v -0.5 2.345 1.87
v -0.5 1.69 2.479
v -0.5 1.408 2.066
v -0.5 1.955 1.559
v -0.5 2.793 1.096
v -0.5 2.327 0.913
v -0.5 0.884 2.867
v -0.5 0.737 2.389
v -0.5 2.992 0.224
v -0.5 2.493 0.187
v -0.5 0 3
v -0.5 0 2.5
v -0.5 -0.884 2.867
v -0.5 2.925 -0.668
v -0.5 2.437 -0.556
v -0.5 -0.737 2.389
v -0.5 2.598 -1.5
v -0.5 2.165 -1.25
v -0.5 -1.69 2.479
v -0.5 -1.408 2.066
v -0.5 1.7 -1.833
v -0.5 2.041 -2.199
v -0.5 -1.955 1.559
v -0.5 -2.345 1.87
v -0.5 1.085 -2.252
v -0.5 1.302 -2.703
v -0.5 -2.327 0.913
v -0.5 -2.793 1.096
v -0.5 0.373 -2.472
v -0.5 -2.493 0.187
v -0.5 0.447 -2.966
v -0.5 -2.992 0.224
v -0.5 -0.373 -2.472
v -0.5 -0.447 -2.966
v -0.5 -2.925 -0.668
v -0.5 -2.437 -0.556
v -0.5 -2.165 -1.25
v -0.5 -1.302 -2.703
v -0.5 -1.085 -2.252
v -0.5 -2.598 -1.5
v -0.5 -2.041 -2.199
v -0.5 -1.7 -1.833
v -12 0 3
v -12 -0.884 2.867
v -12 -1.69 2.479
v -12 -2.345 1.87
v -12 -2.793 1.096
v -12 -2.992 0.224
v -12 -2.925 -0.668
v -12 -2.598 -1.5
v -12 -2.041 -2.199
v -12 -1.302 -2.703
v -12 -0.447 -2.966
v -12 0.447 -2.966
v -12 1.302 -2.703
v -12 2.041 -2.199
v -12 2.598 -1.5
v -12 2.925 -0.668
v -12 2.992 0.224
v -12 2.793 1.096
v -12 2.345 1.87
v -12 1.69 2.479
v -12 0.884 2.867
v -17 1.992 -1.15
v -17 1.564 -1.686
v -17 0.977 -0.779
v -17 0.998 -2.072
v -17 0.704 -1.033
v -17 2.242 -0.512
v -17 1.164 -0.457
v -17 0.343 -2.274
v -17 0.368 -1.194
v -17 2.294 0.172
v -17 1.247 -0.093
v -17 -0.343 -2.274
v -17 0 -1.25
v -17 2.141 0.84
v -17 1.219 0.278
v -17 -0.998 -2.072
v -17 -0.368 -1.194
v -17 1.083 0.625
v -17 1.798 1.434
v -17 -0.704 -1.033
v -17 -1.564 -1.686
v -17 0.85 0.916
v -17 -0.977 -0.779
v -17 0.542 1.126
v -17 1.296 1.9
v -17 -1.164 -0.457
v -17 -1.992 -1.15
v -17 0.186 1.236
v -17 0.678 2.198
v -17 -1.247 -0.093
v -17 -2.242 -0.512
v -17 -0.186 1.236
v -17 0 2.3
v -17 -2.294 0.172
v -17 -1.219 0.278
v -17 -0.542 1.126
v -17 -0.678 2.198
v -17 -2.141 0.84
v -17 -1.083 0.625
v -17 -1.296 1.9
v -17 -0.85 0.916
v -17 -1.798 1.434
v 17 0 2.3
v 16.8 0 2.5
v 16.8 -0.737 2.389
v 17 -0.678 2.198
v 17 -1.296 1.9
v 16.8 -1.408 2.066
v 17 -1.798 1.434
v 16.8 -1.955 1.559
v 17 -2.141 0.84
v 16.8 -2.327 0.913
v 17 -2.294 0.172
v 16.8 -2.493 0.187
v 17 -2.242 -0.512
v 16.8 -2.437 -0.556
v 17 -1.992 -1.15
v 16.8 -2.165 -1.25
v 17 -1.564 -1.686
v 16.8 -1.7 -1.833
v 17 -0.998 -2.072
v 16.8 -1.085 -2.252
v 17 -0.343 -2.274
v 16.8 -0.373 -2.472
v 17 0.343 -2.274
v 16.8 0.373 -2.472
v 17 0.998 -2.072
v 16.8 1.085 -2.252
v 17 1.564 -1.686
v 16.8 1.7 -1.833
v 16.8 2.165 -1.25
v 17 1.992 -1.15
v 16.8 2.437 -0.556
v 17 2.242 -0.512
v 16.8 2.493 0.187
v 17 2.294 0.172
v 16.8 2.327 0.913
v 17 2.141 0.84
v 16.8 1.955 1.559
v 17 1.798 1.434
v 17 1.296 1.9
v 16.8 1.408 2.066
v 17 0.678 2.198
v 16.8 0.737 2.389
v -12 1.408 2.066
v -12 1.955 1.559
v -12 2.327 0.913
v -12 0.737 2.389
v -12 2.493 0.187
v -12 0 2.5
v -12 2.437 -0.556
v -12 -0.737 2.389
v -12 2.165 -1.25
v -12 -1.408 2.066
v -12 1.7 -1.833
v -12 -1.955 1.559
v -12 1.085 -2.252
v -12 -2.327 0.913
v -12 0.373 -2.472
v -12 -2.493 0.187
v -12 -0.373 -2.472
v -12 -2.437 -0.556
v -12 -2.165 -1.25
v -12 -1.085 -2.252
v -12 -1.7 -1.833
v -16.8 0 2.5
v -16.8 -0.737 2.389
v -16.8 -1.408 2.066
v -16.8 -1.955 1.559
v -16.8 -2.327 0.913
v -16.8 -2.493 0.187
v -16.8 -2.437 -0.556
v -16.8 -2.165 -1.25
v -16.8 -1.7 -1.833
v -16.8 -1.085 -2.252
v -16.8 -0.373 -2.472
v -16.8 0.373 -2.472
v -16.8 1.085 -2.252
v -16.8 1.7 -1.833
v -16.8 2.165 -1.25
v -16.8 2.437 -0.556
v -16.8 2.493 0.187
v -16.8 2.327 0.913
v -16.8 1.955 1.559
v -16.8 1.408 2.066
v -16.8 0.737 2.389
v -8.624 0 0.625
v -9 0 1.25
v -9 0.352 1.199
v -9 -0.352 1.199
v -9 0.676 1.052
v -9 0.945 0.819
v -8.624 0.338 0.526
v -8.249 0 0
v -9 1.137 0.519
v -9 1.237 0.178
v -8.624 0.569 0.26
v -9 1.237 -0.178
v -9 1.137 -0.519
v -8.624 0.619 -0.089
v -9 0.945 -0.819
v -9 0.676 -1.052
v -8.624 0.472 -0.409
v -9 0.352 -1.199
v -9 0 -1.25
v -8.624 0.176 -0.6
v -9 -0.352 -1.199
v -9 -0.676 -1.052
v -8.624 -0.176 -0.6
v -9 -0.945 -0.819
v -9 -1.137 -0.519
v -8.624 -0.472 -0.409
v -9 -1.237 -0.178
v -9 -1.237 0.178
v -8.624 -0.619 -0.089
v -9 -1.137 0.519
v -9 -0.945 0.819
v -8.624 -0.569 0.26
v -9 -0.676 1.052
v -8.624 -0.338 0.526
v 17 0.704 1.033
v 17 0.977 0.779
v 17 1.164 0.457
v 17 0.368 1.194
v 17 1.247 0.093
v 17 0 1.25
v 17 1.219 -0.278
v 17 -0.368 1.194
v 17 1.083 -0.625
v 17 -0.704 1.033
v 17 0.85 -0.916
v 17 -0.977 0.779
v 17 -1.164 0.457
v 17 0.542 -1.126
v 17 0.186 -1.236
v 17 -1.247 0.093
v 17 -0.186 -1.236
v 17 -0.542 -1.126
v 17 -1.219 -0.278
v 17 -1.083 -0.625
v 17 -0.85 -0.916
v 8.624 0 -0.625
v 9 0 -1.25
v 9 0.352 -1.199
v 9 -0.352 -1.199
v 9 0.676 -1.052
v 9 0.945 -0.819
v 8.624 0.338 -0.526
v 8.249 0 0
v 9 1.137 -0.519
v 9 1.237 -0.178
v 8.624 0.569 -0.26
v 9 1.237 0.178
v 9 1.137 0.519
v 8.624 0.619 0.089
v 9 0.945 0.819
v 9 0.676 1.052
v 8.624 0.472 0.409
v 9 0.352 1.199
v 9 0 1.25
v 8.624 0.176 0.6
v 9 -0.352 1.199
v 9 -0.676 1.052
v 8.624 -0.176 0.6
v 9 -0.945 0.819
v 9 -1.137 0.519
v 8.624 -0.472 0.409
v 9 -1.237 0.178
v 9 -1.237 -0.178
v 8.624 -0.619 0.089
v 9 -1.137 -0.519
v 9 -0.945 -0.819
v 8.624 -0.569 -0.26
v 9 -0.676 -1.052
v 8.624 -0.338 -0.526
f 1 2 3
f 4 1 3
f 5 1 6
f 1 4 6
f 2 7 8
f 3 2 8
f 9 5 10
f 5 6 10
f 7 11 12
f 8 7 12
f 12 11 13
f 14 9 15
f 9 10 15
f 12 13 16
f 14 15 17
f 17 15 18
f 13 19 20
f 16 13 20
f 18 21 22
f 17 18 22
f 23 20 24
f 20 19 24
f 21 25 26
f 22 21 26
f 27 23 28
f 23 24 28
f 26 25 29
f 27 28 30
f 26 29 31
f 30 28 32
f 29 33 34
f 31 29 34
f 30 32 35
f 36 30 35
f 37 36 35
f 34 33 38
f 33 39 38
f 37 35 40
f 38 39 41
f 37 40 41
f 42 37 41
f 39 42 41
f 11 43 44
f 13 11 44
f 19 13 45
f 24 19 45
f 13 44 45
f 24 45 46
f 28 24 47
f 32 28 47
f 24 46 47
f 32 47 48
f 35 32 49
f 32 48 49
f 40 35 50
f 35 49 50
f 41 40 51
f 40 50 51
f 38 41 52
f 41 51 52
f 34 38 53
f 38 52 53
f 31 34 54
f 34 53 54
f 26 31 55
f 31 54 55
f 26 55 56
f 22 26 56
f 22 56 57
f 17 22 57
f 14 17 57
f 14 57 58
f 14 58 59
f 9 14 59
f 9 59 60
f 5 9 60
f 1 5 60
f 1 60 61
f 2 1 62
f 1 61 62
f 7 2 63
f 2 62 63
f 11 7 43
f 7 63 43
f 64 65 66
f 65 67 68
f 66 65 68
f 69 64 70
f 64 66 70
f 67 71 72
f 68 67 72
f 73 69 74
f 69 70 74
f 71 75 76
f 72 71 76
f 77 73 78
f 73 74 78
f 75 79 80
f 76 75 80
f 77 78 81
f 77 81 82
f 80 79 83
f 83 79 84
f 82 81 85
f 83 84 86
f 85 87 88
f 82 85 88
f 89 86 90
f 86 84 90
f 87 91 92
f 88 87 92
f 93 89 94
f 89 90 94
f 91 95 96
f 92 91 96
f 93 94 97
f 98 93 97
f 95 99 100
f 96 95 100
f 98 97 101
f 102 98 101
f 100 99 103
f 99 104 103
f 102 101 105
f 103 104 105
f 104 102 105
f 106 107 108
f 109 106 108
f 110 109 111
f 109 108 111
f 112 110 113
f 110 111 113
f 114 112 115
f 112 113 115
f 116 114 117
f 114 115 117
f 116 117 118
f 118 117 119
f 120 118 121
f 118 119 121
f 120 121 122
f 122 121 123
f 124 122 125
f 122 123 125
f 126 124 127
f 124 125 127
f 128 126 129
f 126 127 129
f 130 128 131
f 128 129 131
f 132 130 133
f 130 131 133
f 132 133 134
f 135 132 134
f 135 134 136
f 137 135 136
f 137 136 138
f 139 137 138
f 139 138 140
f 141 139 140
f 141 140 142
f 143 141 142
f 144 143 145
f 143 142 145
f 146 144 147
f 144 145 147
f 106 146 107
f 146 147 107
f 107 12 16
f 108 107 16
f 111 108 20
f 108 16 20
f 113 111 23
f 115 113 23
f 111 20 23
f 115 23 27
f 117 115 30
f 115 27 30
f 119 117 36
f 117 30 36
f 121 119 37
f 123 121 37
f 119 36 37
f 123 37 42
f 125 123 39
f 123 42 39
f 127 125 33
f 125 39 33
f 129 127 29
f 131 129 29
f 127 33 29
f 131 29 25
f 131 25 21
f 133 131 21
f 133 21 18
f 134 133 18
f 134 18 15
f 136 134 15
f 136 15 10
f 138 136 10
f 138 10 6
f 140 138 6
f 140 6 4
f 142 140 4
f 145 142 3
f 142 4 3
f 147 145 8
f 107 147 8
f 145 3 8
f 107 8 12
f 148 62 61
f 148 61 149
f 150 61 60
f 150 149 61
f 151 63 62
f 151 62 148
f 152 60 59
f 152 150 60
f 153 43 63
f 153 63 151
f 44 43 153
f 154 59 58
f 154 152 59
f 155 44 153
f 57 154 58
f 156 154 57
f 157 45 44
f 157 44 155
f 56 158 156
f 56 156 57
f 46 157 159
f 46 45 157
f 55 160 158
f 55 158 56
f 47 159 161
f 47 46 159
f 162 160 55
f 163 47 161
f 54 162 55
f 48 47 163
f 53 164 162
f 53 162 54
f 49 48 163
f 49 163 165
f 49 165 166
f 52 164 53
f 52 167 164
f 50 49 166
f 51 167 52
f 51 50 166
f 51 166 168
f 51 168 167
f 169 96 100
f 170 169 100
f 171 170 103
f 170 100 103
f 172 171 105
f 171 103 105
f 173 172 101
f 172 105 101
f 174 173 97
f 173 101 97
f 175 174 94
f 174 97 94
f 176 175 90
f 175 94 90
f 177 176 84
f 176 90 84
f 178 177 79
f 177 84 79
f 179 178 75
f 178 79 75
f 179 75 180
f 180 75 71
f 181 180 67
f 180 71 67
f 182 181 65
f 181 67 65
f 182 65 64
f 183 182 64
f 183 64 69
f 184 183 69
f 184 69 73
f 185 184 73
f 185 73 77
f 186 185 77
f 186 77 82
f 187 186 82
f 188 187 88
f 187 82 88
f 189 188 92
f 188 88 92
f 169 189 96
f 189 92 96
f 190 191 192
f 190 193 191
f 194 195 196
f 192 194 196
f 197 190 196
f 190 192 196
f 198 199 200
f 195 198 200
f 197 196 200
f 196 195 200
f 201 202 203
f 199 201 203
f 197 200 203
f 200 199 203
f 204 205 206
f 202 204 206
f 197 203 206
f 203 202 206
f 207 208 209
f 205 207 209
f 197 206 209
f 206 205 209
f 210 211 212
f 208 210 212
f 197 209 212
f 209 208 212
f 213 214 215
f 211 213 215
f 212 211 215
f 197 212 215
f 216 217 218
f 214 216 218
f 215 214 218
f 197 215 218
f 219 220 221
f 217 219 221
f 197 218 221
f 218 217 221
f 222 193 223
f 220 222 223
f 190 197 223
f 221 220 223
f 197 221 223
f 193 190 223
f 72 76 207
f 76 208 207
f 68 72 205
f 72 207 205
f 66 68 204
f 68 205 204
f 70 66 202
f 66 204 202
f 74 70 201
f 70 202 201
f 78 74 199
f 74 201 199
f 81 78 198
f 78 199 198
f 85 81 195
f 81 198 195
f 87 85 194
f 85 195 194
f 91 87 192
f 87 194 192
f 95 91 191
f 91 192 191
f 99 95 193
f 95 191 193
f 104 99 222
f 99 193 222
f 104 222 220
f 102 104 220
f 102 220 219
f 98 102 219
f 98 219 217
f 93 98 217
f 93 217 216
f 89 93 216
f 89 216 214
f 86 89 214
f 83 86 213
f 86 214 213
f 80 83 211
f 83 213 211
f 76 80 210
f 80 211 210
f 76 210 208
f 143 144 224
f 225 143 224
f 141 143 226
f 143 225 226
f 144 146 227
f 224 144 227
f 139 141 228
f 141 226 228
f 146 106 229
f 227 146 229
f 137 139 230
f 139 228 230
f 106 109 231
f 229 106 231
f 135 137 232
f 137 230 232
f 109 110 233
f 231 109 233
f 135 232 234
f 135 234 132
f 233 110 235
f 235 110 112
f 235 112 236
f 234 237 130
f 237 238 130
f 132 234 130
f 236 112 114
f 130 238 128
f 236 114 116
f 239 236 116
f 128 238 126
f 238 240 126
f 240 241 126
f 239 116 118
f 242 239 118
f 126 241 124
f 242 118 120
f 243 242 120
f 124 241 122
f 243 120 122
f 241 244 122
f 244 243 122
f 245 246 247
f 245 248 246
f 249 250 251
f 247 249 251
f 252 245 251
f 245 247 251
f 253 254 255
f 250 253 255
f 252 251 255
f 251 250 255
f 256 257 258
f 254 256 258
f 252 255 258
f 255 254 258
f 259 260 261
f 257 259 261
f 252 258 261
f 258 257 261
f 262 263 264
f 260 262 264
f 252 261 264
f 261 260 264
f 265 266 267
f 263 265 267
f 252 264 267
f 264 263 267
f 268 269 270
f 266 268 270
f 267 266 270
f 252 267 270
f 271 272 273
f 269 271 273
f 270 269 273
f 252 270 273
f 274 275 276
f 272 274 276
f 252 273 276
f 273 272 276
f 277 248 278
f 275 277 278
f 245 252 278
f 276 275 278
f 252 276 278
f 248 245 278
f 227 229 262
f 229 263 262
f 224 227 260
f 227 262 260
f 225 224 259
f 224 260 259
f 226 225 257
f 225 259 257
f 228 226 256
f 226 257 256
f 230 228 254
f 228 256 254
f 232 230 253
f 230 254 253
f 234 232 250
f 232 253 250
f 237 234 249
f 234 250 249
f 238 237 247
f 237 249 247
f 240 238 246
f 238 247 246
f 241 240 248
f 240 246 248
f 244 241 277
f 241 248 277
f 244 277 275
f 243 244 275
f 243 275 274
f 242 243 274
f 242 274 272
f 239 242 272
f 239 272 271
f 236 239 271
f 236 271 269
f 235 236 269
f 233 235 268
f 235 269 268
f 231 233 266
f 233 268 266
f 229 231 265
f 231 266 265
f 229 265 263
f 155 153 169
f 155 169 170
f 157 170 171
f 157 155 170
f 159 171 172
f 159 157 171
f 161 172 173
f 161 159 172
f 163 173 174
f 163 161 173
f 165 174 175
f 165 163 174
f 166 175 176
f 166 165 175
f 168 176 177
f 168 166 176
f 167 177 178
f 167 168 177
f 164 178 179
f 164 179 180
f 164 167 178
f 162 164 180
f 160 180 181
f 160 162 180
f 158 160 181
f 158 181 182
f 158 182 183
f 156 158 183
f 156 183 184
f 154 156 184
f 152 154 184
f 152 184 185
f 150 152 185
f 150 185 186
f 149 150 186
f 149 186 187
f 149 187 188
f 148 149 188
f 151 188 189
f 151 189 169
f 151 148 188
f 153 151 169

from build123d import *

# Parameters (mm, degrees)
TROU_TARAUD_M31_D     = 2.5
TROU_TARAUD_M31_DEPTH = 8
TROU_TARAUD_M31_TIP   = 0.751075774
ESQUISSE7_W           = 5
ESQUISSE7_H           = 0.5
CHANFREIN1_SIZE       = 0.2
TROU_TARAUD_M32_D     = 2.5
TROU_TARAUD_M32_DEPTH = 8
TROU_TARAUD_M32_TIP   = 0.751075774


with BuildPart() as part:
    # Esquisse2 → Révolution1 (revolve)
    with BuildSketch(Plane.XY, mode=Mode.PRIVATE) as r_volution1_sk:
        Polygon((17, 0), (17, 2.5), (-0.5, 2.5), (-0.5, 3), (-17, 3), (-17, 0), align=None)
    revolve(r_volution1_sk.sketch.rotate(Axis((-17, 0, 0), (1, 0, 0)), 90), axis=Axis((-17, 0, 0), (1, 0, 0)))

    # Trou taraudé M31
    with Locations(Plane(origin=(17, 0, 0), x_dir=(0, 0, -1), z_dir=(1, 0, 0))):
        with Locations((0, 0)):
            Hole(TROU_TARAUD_M31_D / 2, depth=TROU_TARAUD_M31_DEPTH)
            with Locations((0, 0, -(TROU_TARAUD_M31_DEPTH + TROU_TARAUD_M31_TIP / 2))):  # 118° drill point
                Cone(0, TROU_TARAUD_M31_D / 2, TROU_TARAUD_M31_TIP, mode=Mode.SUBTRACT)

    # Esquisse7 → Enlèvement de matière-Révolution1 (revolve, cut)
    with BuildSketch(Plane.XY, mode=Mode.PRIVATE) as enl_vement_de_mati_re_r_volution1_sk:
        with Locations((-14.5, 2.75)):
            Rectangle(ESQUISSE7_W, ESQUISSE7_H)
    revolve(enl_vement_de_mati_re_r_volution1_sk.sketch.rotate(Axis((-17, 0, 0), (1, 0, 0)), 90), axis=Axis((-17, 0, 0), (1, 0, 0)), mode=Mode.SUBTRACT)

    # Chanfrein1
    chanfrein1_edges = [part.edges().sort_by_distance(p)[0] for p in [
        (-17, 0, -2.5),
        (17, 0, -2.5),
    ]]
    chamfer(chanfrein1_edges, length=CHANFREIN1_SIZE)

    # Trou taraudé M32
    with Locations(Plane.ZY.offset(17)):
        with Locations((0, 0)):
            Hole(TROU_TARAUD_M32_D / 2, depth=TROU_TARAUD_M32_DEPTH)
            with Locations((0, 0, -(TROU_TARAUD_M32_DEPTH + TROU_TARAUD_M32_TIP / 2))):  # 118° drill point
                Cone(0, TROU_TARAUD_M32_D / 2, TROU_TARAUD_M32_TIP, mode=Mode.SUBTRACT)


solid = part.part
